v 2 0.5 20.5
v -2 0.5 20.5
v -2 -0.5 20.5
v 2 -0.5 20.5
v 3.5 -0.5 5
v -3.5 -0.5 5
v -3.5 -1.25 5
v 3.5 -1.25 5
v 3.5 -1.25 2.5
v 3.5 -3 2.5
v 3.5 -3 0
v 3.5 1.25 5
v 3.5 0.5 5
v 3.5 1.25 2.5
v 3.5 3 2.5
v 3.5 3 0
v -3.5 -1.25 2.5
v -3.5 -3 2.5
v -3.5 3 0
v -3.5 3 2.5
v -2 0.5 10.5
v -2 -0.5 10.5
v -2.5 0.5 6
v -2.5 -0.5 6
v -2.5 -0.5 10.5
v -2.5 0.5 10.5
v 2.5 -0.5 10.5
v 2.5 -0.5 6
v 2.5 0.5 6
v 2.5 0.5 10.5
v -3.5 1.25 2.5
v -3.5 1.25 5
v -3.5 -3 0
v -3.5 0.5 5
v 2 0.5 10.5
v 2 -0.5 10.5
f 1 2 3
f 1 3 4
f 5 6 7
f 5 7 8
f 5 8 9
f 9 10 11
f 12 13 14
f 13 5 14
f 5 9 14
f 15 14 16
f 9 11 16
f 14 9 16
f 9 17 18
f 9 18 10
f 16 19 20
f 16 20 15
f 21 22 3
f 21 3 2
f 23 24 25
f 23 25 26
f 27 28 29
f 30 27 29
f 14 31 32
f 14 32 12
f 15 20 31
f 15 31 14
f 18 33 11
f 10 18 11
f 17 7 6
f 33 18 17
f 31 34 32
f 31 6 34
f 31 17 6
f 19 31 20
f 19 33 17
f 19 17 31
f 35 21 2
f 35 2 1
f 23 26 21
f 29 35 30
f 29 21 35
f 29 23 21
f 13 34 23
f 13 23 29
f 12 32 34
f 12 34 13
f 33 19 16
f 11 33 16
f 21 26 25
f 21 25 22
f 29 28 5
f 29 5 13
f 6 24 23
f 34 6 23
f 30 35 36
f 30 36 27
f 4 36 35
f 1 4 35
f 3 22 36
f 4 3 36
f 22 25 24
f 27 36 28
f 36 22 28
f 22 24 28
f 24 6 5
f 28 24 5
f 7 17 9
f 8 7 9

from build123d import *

# Parameters (mm, degrees)
SKETCH_1_W      = 7
SKETCH_1_H      = 6
EXTRUDE_1_DEPTH = 2.5
SKETCH_2_W      = 7
SKETCH_2_H      = 2.5
EXTRUDE_2_DEPTH = 2.5
SKETCH_3_W      = 7
SKETCH_3_H      = 1
EXTRUDE_3_DEPTH = 1
SKETCH_4_W      = 5
SKETCH_4_H      = 1
EXTRUDE_4_DEPTH = 4.5
SKETCH_5_W      = 4
SKETCH_5_H      = 1
EXTRUDE_5_DEPTH = 10
CHAMFER_1_SIZE  = 1


with BuildPart() as part:
    # 스케치1 → 보스-돌출1 (new body)
    with BuildSketch(Plane.XY):
        Rectangle(SKETCH_1_W, SKETCH_1_H)
    extrude(amount=EXTRUDE_1_DEPTH)

    # 스케치2 → 보스-돌출2 (add)
    with BuildSketch(Plane.XY.offset(2.5)):
        Rectangle(SKETCH_2_W, SKETCH_2_H)
    extrude(amount=EXTRUDE_2_DEPTH)

    # 스케치3 → 보스-돌출3 (add)
    with BuildSketch(Plane.XY.offset(5)):
        Rectangle(SKETCH_3_W, SKETCH_3_H)
    extrude(amount=EXTRUDE_3_DEPTH)

    # 스케치4 → 보스-돌출4 (add)
    with BuildSketch(Plane.XY.offset(6)):
        Rectangle(SKETCH_4_W, SKETCH_4_H)
    extrude(amount=EXTRUDE_4_DEPTH)

    # 스케치5 → 보스-돌출5 (add)
    with BuildSketch(Plane.XY.offset(10.5)):
        Rectangle(SKETCH_5_W, SKETCH_5_H)
    extrude(amount=EXTRUDE_5_DEPTH)

    # 모따기1
    chamfer_1_edges = [part.edges().sort_by_distance(p)[0] for p in [
        (3.5, 0, 6),
        (-3.5, 0, 6),
    ]]
    chamfer(chamfer_1_edges, length=CHAMFER_1_SIZE - 0.0001)  # a hair under: the kernel refuses the full size


solid = part.part
